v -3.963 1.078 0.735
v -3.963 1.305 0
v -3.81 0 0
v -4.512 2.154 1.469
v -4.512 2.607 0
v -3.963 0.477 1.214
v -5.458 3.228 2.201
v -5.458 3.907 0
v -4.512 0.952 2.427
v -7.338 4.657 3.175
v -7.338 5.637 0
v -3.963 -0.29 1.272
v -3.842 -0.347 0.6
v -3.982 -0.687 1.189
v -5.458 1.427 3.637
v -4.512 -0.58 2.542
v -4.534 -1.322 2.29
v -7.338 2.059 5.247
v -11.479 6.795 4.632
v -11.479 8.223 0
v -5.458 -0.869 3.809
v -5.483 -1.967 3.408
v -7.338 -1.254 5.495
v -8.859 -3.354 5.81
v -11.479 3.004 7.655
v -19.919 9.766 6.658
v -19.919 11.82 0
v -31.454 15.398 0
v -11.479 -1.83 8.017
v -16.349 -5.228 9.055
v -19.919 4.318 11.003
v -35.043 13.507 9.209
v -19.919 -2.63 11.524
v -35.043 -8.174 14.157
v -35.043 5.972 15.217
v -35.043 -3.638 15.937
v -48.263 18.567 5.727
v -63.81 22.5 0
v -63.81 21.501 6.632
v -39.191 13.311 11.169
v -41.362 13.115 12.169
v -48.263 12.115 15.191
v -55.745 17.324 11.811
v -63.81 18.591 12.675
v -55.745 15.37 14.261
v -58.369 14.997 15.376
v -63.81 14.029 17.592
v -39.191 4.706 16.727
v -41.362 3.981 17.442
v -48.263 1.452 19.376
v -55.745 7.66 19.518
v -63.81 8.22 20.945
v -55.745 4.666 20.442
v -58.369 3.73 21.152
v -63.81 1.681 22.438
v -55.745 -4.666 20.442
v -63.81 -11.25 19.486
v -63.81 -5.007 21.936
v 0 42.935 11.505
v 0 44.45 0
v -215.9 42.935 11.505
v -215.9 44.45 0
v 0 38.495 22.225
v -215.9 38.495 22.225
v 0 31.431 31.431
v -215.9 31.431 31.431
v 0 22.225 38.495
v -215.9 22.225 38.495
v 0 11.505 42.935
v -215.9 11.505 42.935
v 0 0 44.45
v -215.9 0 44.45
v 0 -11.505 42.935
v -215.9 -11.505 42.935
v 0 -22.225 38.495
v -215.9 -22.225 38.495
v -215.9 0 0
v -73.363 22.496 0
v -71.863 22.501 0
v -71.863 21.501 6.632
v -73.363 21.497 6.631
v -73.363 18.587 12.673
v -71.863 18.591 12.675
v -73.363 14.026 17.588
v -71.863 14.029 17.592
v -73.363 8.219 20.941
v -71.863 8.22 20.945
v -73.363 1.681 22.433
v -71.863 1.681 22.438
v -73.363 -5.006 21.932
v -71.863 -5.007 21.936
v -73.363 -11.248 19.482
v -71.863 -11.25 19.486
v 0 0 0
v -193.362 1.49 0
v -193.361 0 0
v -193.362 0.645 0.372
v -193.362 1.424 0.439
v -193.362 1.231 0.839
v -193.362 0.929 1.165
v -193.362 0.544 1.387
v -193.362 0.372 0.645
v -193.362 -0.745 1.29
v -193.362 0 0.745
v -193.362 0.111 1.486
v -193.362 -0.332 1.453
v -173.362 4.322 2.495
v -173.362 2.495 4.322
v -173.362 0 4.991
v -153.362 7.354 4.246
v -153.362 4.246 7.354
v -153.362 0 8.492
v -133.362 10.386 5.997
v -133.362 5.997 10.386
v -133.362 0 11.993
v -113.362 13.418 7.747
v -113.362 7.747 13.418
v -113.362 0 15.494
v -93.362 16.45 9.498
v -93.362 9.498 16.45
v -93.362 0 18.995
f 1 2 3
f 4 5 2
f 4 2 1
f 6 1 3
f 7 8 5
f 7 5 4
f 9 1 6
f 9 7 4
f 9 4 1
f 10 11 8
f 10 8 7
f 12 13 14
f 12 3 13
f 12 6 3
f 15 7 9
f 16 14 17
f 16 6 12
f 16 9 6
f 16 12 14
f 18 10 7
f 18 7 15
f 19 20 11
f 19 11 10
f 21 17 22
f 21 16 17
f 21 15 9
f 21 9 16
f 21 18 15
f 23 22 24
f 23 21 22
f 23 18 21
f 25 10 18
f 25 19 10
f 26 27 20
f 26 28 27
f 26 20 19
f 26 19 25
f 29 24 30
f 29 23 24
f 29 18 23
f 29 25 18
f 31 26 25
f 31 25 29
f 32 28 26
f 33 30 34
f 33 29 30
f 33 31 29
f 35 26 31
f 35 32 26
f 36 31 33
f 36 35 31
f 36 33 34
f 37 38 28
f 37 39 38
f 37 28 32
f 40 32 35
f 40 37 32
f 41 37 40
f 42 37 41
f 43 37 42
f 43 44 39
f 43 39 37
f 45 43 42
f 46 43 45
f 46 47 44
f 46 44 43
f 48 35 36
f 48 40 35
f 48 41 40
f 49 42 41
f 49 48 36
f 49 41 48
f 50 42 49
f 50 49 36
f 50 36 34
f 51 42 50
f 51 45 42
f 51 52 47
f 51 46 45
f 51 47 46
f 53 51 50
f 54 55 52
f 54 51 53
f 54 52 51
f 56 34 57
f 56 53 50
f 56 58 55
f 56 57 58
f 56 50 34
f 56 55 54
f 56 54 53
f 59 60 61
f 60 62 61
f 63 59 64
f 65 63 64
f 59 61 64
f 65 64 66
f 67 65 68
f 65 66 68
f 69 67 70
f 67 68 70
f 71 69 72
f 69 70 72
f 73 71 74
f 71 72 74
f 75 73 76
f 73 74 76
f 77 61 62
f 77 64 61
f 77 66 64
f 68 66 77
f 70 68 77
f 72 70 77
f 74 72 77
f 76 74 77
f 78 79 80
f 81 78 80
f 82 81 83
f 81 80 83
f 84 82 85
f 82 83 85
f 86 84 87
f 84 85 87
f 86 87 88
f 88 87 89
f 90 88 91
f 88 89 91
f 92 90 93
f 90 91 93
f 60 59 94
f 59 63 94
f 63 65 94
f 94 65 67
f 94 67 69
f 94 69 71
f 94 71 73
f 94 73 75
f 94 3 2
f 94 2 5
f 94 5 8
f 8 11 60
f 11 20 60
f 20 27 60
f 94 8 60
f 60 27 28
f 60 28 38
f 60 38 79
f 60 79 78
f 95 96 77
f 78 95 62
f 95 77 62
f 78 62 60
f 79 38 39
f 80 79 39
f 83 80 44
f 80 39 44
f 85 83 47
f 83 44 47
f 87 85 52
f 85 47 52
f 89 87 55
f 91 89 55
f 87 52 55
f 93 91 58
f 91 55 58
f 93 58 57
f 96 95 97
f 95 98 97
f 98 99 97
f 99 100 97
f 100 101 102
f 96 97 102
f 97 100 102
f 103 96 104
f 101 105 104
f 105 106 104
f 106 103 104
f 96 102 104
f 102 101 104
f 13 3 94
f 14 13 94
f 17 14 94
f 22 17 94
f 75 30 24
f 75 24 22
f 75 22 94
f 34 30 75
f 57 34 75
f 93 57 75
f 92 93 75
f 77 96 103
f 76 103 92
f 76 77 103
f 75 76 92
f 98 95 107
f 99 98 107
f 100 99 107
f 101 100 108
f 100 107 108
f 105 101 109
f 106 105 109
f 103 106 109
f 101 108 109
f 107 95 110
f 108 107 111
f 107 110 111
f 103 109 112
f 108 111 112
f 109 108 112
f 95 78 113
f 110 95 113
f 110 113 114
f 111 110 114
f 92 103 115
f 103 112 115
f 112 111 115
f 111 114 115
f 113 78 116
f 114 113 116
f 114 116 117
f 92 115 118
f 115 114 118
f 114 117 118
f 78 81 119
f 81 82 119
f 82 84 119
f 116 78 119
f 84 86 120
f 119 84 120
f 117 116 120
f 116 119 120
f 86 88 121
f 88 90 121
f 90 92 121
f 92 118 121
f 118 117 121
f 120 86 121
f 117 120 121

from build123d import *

# Parameters (mm, degrees)
SKETCH1_W      = 44.45
SKETCH1_H      = 215.9
REVOLVE1_ANGLE = 120


with BuildPart() as part:
    # Sketch1 → Revolve1 (revolve)
    with BuildSketch(Plane(origin=(0, 0, 0), x_dir=(0, 1, 0), z_dir=(0, 0, 1))):
        with Locations((22.225, 107.95)):
            Rectangle(SKETCH1_W, SKETCH1_H)
    revolve(axis=Axis((0, 0, 0), (1, 0, 0)), revolution_arc=REVOLVE1_ANGLE)

    # Sketch21 → Cut-Revolve21 (revolve, cut)
    with BuildSketch(Plane(origin=(0, 0, 0), x_dir=(-1, 0, 0), z_dir=(0, 0, -1))):
        with BuildLine():
            Line((3.81, 0), (193.361475911, 0))
            Line((193.361475911, 0), (193.361555592, 1.489862296))
            Line((193.361555592, 1.489862296), (73.362678959, 22.496280175))
            Line((73.362678959, 22.496280175), (71.862679183, 22.500563741))
            Line((71.862679183, 22.500563741), (63.809813581, 22.500497032))
            add(Edge.make_bspline(
                [(3.81, 0), (3.409136339, 11.429131598), (63.809813581, 22.500497032)],
                knots=[0, 0, 0, 1, 1, 1], degree=2))
        make_face()
    revolve(axis=Axis((-215.9, 0, 0), (1, 0, 0)), mode=Mode.SUBTRACT)


solid = part.part
